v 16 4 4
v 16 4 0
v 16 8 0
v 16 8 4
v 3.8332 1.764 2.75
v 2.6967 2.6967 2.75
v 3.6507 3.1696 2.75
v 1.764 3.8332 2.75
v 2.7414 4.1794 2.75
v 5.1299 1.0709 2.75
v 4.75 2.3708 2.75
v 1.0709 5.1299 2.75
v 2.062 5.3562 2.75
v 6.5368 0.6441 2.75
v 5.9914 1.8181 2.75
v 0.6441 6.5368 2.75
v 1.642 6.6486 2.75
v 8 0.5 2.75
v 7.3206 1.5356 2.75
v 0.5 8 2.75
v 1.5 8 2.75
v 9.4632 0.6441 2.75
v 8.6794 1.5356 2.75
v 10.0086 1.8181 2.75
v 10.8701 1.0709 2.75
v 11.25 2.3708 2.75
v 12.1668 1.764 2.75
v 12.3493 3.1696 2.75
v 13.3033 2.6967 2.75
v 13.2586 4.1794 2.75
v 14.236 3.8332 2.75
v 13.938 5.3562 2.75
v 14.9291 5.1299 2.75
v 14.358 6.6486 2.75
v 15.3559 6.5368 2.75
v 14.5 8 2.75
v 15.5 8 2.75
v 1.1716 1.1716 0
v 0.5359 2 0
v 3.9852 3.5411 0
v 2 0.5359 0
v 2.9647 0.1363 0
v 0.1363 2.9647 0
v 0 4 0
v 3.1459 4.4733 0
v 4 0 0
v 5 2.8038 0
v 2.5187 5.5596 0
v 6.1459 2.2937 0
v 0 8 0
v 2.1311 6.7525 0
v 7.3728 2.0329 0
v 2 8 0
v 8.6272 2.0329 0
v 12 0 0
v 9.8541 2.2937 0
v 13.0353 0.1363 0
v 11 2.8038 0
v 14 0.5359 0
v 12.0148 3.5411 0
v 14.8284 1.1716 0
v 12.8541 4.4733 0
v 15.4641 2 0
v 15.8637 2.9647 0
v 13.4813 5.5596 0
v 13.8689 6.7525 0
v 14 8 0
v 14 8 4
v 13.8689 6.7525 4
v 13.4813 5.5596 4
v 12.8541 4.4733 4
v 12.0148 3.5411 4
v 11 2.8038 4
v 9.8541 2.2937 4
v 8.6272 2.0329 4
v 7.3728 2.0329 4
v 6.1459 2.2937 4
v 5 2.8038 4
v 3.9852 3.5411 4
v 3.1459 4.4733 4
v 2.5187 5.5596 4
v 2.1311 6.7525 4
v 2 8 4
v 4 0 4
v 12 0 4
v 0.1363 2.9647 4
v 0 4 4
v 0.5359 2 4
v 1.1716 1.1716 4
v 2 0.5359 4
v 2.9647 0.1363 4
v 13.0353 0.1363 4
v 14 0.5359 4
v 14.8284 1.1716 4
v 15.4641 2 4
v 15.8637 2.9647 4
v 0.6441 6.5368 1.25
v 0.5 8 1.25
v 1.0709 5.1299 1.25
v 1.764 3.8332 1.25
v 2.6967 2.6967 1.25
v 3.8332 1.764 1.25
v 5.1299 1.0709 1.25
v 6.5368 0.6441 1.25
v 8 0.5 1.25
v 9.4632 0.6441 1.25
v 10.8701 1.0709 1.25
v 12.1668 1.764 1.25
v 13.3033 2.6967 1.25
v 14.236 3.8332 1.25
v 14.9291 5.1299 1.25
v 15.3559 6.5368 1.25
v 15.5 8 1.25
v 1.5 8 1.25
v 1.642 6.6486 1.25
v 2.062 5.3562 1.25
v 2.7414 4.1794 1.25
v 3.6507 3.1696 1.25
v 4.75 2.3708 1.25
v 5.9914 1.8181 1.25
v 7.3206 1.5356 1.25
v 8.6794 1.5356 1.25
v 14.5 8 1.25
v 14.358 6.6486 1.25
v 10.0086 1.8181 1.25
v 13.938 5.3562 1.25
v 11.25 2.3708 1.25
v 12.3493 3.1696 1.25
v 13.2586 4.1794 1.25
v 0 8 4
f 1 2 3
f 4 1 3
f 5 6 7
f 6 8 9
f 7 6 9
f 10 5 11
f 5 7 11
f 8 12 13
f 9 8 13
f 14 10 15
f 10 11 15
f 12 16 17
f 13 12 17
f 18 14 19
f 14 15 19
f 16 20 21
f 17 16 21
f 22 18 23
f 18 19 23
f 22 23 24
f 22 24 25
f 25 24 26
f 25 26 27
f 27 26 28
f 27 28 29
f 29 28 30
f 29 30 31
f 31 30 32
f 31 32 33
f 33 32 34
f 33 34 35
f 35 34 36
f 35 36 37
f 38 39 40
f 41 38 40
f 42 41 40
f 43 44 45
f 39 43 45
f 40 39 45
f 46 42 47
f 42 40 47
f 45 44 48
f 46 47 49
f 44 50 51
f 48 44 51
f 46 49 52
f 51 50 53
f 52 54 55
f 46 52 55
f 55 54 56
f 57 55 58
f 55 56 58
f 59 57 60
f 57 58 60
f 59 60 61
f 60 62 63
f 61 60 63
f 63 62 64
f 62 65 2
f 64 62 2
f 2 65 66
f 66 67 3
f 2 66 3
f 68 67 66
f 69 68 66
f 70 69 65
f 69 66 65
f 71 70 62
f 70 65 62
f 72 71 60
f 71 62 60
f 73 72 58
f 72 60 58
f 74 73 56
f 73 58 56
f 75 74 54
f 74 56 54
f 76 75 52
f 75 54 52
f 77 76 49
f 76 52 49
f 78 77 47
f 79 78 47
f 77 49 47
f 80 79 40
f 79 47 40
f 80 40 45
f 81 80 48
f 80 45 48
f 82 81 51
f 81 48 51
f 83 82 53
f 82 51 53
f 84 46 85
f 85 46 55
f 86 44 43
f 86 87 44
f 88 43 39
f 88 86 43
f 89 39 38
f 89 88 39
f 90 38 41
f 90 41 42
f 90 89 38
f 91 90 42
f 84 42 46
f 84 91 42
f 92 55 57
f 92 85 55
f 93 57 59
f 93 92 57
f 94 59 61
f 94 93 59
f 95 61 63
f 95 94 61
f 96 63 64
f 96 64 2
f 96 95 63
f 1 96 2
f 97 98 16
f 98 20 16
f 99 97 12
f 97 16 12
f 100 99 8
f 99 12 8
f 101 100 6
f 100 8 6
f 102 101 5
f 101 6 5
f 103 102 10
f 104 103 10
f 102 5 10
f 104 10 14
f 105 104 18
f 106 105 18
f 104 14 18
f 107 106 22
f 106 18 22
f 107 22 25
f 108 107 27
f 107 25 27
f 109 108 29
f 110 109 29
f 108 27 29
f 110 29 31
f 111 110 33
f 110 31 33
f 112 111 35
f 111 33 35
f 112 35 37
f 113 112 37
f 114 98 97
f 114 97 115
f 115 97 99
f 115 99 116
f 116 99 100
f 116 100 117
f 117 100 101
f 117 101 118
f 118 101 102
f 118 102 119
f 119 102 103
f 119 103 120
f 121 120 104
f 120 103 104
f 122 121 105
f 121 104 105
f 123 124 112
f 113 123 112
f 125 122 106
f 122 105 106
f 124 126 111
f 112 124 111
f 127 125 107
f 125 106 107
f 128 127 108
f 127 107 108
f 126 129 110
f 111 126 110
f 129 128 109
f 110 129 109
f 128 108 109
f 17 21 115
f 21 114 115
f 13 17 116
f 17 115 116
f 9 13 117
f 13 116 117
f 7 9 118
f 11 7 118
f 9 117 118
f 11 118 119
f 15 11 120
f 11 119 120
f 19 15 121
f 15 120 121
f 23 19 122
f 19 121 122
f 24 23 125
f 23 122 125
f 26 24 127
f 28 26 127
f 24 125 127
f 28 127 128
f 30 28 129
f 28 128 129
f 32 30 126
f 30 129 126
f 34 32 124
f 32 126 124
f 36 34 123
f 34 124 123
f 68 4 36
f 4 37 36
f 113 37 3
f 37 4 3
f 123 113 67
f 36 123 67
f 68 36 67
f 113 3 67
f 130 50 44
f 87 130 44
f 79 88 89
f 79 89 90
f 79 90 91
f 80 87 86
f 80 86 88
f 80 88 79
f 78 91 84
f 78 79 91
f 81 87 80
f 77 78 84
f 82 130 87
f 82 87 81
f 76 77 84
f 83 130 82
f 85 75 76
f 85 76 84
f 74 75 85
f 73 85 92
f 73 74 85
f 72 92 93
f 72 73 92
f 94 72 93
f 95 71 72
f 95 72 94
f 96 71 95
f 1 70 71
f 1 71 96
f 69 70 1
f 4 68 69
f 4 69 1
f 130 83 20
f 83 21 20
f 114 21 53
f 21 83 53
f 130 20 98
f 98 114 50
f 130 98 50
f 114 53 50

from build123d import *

# Parameters (mm, degrees)
F1_DEPTH = 4
F2_R     = 4
F5_W     = 1
F5_H     = 1.5


with BuildPart() as f1:
    # F0 (on Top) → F1 (new body)
    with BuildSketch(Plane.XY):
        with BuildLine():
            Line((0, 8), (0, 0))
            Line((0, 0), (16, 0))
            Line((16, 0), (16, 8))
            Line((16, 8), (14, 8))
            ThreePointArc((14, 8), (8, 2), (2, 8))
            Line((2, 8), (0, 8))
        make_face()
    extrude(amount=F1_DEPTH)

    # F2
    f2_edges = [f1.edges().sort_by_distance(p)[0] for p in [
        (16, 0, 2),
        (0, 0, 2),
    ]]
    fillet(f2_edges, radius=F2_R)

    # F6: sweep along a path in F4
    with BuildLine(Plane.XY.offset(2)) as f6_path:
        ThreePointArc((1, 8), (8, 1), (15, 8))
    # F5 (on face) → F6 (sweep, cut)
    with BuildSketch(Plane(origin=(0, 8, 0), x_dir=(-1, 0, 0), z_dir=(0, 1, 0))):
        with Locations((-1, 2)):
            Rectangle(F5_W, F5_H)
    sweep(path=f6_path.line, mode=Mode.SUBTRACT)


solid = f1.part
